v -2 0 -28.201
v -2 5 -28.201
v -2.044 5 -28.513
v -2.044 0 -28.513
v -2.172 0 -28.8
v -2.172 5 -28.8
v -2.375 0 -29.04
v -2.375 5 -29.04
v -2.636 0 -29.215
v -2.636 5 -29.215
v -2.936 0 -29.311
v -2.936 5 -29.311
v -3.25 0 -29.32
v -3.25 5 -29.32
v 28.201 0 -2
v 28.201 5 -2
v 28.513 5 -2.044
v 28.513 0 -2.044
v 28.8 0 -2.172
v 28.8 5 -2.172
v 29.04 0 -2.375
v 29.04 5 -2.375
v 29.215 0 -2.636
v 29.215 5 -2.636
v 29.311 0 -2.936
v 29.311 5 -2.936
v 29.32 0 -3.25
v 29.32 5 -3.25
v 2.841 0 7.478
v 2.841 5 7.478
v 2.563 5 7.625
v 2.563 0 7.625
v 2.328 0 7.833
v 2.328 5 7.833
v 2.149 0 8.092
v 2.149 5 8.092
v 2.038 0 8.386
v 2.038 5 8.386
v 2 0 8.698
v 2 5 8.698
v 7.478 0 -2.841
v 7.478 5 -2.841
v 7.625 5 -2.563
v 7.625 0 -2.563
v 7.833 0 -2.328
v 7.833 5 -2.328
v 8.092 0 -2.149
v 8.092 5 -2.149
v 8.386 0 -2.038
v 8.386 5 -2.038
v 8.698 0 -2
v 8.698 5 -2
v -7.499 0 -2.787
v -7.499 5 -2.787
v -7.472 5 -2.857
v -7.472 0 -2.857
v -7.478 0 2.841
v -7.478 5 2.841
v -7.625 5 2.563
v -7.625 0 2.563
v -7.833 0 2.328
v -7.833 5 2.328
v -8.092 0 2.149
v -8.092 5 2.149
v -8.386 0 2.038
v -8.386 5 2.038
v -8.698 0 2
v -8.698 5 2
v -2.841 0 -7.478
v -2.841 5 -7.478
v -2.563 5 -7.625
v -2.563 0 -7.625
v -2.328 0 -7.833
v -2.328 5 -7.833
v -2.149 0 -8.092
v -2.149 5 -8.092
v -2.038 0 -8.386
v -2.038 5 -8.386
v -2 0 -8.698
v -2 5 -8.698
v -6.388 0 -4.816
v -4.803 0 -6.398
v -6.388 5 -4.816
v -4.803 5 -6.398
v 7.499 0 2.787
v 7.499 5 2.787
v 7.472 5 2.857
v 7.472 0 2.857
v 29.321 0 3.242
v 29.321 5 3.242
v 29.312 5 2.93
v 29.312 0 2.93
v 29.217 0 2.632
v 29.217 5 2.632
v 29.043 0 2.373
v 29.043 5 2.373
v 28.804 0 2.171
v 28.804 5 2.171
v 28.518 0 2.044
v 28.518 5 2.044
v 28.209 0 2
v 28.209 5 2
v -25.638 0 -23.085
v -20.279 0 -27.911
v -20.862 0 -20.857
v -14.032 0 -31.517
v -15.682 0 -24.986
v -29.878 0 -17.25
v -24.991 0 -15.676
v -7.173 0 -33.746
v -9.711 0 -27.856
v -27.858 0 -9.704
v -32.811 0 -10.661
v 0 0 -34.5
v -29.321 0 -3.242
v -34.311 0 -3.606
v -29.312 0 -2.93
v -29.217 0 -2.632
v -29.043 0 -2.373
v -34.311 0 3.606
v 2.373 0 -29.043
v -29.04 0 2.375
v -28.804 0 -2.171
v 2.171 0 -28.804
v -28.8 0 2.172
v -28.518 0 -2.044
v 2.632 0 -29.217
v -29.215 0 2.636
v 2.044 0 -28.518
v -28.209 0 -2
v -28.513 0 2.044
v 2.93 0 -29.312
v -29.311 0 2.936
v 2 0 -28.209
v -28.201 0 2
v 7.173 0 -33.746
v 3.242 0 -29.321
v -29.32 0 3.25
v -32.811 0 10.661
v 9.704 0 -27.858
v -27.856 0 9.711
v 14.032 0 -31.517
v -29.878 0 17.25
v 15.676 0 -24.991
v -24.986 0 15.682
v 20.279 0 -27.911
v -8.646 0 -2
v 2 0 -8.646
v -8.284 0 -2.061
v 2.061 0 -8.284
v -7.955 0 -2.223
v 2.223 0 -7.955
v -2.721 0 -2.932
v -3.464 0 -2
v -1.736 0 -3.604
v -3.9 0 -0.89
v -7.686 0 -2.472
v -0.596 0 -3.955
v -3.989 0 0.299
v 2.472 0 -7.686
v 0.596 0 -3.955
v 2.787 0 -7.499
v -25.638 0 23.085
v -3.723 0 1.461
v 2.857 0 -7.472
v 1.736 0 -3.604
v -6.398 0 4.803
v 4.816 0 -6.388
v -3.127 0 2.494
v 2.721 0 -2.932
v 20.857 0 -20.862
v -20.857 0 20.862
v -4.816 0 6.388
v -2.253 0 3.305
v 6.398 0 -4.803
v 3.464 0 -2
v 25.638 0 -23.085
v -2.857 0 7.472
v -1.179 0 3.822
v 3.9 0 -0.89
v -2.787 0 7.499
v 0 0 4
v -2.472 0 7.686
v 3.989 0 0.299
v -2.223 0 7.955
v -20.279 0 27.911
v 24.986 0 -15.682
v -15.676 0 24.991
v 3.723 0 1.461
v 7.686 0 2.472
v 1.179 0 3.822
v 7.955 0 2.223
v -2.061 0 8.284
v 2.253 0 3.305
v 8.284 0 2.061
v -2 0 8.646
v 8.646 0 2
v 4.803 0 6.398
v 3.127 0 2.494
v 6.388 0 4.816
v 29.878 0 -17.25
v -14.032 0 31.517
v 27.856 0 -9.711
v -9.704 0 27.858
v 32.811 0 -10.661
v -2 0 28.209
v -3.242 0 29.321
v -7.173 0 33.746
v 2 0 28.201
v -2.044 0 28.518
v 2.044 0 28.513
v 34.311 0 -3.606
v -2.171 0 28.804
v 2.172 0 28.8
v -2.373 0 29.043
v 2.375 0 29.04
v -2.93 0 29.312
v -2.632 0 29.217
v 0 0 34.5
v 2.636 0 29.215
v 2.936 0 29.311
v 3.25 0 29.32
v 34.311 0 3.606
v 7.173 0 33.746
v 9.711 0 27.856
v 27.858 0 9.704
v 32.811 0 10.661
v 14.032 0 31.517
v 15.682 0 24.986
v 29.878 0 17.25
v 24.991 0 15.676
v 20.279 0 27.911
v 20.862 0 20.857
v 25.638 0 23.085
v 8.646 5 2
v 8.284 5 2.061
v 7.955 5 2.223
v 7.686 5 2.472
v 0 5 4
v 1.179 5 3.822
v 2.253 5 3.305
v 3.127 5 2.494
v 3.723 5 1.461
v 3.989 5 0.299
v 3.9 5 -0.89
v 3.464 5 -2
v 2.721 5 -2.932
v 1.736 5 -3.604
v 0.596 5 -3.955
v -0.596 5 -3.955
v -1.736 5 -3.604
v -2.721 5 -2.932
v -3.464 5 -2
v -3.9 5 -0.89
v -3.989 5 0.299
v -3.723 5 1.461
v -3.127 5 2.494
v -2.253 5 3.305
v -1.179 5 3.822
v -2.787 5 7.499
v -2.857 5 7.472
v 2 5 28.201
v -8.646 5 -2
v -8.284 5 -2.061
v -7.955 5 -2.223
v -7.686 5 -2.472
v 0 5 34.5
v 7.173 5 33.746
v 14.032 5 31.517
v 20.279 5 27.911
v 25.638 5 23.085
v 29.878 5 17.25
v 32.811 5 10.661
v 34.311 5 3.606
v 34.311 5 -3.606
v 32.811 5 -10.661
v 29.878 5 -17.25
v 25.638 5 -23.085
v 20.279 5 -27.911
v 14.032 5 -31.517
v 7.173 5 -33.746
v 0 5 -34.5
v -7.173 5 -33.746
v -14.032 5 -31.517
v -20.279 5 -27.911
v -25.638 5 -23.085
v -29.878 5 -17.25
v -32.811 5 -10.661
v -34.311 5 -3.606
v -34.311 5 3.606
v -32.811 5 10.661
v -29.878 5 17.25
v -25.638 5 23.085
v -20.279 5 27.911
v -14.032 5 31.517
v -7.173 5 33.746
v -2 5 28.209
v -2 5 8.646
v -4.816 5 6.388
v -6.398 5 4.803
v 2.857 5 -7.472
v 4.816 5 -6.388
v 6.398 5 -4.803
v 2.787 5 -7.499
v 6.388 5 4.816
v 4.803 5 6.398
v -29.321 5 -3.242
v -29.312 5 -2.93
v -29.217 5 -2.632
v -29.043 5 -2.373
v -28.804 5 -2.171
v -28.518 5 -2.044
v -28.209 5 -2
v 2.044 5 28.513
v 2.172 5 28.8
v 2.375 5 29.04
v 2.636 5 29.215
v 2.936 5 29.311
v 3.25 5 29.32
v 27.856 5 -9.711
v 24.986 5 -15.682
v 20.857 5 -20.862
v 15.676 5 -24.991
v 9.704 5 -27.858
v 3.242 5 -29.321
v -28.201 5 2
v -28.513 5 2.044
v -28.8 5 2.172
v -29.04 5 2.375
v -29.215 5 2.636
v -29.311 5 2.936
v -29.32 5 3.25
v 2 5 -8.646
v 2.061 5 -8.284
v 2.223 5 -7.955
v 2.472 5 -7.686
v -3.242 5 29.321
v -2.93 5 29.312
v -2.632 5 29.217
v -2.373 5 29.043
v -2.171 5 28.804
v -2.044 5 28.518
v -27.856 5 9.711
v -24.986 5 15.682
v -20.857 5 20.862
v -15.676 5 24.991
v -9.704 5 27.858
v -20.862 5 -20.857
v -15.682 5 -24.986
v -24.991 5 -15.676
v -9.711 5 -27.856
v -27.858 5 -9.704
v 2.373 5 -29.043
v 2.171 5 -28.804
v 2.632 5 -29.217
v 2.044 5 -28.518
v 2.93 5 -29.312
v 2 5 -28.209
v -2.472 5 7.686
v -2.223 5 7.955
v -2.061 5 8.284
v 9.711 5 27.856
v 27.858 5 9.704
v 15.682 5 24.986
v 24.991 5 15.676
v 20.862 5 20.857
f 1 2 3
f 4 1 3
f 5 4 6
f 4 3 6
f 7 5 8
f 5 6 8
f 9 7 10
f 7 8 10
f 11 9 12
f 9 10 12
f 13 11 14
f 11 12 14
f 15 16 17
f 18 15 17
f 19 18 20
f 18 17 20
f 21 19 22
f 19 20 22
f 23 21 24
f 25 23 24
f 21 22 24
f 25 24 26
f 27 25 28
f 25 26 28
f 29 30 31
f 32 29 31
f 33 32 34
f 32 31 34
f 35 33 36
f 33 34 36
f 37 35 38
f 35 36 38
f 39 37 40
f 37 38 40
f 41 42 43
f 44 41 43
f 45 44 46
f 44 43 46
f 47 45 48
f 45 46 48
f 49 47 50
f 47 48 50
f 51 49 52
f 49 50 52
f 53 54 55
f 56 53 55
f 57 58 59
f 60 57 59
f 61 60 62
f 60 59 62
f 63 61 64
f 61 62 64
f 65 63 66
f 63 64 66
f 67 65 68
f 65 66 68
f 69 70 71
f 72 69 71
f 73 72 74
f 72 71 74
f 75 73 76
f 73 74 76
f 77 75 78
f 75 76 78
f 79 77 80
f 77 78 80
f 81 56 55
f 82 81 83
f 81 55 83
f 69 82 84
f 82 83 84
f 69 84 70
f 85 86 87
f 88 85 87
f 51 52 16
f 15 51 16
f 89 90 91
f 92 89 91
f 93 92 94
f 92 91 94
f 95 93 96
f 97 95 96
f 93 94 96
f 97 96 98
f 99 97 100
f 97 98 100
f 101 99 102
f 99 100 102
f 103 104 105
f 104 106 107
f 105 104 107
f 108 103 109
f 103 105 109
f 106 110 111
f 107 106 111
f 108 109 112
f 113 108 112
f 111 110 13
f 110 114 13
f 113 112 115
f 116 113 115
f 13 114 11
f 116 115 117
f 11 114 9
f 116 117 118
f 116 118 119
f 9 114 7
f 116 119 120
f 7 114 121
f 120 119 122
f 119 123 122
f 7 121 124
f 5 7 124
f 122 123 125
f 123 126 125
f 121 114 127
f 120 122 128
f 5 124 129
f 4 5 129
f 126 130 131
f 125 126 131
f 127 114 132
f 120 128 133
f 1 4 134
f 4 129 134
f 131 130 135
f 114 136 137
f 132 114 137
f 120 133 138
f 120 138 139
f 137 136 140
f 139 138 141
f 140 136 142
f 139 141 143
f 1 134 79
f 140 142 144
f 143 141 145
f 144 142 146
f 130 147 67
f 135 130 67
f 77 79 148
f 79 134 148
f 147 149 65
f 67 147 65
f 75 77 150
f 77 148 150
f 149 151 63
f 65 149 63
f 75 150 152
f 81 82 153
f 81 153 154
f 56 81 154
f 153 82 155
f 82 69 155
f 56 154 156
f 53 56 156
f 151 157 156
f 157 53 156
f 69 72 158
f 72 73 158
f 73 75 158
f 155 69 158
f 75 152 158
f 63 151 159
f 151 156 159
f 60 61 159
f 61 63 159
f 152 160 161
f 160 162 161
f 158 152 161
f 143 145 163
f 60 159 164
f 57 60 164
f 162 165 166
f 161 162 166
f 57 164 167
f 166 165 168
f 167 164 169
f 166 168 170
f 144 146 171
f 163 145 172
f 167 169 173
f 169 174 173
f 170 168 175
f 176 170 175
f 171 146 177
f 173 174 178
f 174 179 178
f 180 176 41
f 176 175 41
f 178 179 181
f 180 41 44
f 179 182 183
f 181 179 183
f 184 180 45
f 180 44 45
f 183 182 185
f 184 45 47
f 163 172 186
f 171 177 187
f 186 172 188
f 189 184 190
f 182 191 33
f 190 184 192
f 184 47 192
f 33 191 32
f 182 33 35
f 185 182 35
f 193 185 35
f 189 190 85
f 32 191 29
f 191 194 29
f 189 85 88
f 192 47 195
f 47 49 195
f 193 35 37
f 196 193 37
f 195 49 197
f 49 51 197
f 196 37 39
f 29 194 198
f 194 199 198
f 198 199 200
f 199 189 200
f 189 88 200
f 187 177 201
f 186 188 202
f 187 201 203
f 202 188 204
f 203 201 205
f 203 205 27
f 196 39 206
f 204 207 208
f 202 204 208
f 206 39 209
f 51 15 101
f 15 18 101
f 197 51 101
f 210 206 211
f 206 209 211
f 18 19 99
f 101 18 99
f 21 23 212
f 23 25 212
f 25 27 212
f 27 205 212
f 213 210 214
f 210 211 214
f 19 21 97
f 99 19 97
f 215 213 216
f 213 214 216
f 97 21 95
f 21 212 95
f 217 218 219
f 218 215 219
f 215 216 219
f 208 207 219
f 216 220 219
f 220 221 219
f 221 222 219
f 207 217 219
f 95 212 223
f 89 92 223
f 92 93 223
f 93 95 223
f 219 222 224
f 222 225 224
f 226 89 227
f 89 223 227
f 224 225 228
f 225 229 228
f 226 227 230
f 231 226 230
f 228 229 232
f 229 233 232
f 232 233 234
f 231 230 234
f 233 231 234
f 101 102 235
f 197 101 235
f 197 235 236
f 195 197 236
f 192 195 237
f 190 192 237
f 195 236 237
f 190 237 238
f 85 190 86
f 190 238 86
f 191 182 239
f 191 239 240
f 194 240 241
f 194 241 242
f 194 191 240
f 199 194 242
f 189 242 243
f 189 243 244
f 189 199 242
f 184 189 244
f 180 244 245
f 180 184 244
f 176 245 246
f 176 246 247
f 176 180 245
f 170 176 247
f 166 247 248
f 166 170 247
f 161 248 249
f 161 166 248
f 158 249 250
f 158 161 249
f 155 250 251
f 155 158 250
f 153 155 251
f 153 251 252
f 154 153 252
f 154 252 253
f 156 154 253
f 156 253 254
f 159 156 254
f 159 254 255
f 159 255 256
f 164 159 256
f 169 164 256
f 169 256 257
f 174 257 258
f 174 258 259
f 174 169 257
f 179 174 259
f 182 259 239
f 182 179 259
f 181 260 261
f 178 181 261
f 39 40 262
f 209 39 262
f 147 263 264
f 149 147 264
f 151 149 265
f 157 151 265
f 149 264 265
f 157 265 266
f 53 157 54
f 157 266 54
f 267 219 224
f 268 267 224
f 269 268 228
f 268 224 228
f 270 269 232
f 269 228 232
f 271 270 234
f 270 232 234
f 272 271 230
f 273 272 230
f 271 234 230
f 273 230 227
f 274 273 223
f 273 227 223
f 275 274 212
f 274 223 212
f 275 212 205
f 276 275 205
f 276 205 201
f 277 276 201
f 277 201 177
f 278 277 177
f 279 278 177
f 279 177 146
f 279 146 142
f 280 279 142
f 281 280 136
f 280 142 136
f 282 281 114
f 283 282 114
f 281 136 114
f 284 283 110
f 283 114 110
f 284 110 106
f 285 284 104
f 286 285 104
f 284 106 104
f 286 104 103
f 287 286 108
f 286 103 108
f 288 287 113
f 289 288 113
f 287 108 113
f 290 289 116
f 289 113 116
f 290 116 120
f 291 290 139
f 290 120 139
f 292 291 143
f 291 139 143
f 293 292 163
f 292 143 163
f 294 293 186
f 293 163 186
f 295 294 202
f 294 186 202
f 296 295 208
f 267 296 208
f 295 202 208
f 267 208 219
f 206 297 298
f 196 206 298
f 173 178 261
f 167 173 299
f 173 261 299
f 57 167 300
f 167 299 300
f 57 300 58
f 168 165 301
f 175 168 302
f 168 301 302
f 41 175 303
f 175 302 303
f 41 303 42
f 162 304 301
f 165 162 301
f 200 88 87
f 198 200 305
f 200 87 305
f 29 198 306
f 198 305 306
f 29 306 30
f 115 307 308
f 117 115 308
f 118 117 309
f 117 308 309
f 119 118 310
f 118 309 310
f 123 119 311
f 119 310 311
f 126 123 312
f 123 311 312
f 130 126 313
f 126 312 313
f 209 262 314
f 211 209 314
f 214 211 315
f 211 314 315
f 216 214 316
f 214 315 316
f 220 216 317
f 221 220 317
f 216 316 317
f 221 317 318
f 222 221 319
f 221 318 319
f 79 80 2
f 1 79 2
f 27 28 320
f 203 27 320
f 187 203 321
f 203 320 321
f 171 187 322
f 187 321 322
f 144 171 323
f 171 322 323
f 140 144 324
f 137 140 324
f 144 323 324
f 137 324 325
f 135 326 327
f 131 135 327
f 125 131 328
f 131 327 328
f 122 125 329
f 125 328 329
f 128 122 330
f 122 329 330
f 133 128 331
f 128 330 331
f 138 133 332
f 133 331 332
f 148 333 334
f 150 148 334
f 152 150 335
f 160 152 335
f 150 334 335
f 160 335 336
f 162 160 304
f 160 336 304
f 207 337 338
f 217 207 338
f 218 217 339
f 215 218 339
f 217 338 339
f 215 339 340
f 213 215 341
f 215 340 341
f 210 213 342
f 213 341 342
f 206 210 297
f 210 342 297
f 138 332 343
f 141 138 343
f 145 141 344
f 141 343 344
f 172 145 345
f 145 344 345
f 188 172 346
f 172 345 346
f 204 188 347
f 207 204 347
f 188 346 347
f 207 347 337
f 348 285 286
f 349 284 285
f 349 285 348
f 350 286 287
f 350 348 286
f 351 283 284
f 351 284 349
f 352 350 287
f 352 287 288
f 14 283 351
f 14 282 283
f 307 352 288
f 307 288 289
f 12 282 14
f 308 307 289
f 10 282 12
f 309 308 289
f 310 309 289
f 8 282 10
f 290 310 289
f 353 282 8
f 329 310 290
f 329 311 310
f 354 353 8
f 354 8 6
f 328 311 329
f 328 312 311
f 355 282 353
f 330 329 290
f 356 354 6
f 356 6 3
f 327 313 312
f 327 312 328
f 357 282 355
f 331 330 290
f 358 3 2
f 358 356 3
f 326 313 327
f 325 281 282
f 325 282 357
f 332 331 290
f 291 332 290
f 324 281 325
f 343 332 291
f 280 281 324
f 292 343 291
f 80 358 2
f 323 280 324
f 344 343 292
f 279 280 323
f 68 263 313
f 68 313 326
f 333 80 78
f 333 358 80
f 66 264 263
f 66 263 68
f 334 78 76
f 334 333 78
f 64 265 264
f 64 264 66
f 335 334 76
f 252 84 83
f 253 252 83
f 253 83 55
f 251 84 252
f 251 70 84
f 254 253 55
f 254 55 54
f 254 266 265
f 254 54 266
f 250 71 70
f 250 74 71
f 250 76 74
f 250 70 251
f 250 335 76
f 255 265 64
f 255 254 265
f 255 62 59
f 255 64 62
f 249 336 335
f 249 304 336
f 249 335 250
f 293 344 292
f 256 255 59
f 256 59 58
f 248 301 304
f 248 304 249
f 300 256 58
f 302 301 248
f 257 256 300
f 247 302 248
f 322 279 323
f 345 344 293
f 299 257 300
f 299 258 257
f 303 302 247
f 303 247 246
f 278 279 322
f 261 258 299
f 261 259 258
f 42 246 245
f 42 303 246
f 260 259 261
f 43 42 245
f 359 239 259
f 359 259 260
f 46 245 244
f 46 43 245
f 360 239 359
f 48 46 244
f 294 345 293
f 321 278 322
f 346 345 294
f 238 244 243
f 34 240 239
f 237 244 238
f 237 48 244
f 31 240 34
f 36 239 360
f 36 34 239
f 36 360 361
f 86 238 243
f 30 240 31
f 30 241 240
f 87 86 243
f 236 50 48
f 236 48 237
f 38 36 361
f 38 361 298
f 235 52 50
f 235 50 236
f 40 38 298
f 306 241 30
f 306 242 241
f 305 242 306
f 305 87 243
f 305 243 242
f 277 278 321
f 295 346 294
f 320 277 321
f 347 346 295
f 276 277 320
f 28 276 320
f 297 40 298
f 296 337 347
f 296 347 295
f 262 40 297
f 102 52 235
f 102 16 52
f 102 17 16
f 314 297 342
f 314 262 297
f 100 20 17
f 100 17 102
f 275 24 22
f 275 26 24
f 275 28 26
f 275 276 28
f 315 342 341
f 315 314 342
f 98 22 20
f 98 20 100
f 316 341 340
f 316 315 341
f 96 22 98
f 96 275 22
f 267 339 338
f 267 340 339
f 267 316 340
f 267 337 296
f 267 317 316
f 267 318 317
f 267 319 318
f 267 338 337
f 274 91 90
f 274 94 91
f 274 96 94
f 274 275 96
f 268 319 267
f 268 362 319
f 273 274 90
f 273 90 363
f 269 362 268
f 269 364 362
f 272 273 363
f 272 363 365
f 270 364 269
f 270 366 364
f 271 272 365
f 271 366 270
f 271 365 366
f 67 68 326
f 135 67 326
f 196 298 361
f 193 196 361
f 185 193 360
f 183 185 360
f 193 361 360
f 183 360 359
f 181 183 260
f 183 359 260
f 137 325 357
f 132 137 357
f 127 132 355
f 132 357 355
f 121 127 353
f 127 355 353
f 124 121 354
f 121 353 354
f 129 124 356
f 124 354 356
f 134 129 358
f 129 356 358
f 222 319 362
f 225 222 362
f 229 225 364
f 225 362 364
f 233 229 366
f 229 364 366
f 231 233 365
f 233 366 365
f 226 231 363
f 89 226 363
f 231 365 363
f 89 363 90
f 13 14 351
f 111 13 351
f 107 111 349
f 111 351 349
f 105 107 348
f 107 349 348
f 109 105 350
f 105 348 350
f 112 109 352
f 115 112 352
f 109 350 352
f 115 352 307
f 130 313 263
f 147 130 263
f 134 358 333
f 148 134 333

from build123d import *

# Parameters (mm, degrees)
SKETCH1_R           = 34.5
SKETCH1_R_2         = 4
BOSS_EXTRUDE1_DEPTH = 5
CUT_EXTRUDE2_DEPTH  = 50.045896872
CIRPATTERN1_COUNT   = 4


with BuildPart() as part:
    # Sketch1 → Boss-Extrude1 (new body)
    with BuildSketch(Plane(origin=(0, 0, 0), x_dir=(1, 0, 0), z_dir=(0, 1, 0))):
        with Locations(Location((0, 0, 0), (0, 0, 270))):
            Circle(SKETCH1_R)
        with Locations(Location((0, 0, 0), (0, 0, 270))):
            Circle(SKETCH1_R_2, mode=Mode.SUBTRACT)
    extrude(amount=BOSS_EXTRUDE1_DEPTH)

    # Sketch8 → Cut-Extrude2 (cut, through all)
    with BuildSketch(Plane(origin=(0, 5, 0), x_dir=(1, 0, 0), z_dir=(0, 1, 0))):
        with BuildLine():
            Line((-8.698076686, -2), (-28.201327726, -2))
            ThreePointArc((-28.201327726, -2), (-29.040208751, -2.374920589), (-29.320428032, -3.25))
            ThreePointArc((-29.320428032, -3.25), (-20.856955891, -20.862343851), (-3.242426547, -29.321266516))
            ThreePointArc((-3.242426547, -29.321266516), (-2.372627527, -29.04255234), (-2, -28.208657471))
            Line((-2, -28.208657471), (-2, -8.645966692))
            ThreePointArc((-2, -8.645966692), (-2.222589282, -7.955091785), (-2.787089084, -7.498808868))
            Line((-2.787089084, -7.498808868), (-2.857385295, -7.472305486))
            ThreePointArc((-2.857385295, -7.472305486), (-5.662928364, -5.650773606), (-7.478427834, -2.841323131))
            ThreePointArc((-7.478427834, -2.841323131), (-7.957237983, -2.230732861), (-8.698076686, -2))
        make_face()
    cut_extrude2 = extrude(amount=-CUT_EXTRUDE2_DEPTH, mode=Mode.SUBTRACT)

    # CirPattern1: Cut-Extrude2 ×4 about axis
    cirpattern1_axis = Axis((0, 0, 0), (0, 1, 0))
    for i in range(1, CIRPATTERN1_COUNT):
        add(cut_extrude2.rotate(cirpattern1_axis, i * 360 / CIRPATTERN1_COUNT), mode=Mode.SUBTRACT)


solid = part.part
